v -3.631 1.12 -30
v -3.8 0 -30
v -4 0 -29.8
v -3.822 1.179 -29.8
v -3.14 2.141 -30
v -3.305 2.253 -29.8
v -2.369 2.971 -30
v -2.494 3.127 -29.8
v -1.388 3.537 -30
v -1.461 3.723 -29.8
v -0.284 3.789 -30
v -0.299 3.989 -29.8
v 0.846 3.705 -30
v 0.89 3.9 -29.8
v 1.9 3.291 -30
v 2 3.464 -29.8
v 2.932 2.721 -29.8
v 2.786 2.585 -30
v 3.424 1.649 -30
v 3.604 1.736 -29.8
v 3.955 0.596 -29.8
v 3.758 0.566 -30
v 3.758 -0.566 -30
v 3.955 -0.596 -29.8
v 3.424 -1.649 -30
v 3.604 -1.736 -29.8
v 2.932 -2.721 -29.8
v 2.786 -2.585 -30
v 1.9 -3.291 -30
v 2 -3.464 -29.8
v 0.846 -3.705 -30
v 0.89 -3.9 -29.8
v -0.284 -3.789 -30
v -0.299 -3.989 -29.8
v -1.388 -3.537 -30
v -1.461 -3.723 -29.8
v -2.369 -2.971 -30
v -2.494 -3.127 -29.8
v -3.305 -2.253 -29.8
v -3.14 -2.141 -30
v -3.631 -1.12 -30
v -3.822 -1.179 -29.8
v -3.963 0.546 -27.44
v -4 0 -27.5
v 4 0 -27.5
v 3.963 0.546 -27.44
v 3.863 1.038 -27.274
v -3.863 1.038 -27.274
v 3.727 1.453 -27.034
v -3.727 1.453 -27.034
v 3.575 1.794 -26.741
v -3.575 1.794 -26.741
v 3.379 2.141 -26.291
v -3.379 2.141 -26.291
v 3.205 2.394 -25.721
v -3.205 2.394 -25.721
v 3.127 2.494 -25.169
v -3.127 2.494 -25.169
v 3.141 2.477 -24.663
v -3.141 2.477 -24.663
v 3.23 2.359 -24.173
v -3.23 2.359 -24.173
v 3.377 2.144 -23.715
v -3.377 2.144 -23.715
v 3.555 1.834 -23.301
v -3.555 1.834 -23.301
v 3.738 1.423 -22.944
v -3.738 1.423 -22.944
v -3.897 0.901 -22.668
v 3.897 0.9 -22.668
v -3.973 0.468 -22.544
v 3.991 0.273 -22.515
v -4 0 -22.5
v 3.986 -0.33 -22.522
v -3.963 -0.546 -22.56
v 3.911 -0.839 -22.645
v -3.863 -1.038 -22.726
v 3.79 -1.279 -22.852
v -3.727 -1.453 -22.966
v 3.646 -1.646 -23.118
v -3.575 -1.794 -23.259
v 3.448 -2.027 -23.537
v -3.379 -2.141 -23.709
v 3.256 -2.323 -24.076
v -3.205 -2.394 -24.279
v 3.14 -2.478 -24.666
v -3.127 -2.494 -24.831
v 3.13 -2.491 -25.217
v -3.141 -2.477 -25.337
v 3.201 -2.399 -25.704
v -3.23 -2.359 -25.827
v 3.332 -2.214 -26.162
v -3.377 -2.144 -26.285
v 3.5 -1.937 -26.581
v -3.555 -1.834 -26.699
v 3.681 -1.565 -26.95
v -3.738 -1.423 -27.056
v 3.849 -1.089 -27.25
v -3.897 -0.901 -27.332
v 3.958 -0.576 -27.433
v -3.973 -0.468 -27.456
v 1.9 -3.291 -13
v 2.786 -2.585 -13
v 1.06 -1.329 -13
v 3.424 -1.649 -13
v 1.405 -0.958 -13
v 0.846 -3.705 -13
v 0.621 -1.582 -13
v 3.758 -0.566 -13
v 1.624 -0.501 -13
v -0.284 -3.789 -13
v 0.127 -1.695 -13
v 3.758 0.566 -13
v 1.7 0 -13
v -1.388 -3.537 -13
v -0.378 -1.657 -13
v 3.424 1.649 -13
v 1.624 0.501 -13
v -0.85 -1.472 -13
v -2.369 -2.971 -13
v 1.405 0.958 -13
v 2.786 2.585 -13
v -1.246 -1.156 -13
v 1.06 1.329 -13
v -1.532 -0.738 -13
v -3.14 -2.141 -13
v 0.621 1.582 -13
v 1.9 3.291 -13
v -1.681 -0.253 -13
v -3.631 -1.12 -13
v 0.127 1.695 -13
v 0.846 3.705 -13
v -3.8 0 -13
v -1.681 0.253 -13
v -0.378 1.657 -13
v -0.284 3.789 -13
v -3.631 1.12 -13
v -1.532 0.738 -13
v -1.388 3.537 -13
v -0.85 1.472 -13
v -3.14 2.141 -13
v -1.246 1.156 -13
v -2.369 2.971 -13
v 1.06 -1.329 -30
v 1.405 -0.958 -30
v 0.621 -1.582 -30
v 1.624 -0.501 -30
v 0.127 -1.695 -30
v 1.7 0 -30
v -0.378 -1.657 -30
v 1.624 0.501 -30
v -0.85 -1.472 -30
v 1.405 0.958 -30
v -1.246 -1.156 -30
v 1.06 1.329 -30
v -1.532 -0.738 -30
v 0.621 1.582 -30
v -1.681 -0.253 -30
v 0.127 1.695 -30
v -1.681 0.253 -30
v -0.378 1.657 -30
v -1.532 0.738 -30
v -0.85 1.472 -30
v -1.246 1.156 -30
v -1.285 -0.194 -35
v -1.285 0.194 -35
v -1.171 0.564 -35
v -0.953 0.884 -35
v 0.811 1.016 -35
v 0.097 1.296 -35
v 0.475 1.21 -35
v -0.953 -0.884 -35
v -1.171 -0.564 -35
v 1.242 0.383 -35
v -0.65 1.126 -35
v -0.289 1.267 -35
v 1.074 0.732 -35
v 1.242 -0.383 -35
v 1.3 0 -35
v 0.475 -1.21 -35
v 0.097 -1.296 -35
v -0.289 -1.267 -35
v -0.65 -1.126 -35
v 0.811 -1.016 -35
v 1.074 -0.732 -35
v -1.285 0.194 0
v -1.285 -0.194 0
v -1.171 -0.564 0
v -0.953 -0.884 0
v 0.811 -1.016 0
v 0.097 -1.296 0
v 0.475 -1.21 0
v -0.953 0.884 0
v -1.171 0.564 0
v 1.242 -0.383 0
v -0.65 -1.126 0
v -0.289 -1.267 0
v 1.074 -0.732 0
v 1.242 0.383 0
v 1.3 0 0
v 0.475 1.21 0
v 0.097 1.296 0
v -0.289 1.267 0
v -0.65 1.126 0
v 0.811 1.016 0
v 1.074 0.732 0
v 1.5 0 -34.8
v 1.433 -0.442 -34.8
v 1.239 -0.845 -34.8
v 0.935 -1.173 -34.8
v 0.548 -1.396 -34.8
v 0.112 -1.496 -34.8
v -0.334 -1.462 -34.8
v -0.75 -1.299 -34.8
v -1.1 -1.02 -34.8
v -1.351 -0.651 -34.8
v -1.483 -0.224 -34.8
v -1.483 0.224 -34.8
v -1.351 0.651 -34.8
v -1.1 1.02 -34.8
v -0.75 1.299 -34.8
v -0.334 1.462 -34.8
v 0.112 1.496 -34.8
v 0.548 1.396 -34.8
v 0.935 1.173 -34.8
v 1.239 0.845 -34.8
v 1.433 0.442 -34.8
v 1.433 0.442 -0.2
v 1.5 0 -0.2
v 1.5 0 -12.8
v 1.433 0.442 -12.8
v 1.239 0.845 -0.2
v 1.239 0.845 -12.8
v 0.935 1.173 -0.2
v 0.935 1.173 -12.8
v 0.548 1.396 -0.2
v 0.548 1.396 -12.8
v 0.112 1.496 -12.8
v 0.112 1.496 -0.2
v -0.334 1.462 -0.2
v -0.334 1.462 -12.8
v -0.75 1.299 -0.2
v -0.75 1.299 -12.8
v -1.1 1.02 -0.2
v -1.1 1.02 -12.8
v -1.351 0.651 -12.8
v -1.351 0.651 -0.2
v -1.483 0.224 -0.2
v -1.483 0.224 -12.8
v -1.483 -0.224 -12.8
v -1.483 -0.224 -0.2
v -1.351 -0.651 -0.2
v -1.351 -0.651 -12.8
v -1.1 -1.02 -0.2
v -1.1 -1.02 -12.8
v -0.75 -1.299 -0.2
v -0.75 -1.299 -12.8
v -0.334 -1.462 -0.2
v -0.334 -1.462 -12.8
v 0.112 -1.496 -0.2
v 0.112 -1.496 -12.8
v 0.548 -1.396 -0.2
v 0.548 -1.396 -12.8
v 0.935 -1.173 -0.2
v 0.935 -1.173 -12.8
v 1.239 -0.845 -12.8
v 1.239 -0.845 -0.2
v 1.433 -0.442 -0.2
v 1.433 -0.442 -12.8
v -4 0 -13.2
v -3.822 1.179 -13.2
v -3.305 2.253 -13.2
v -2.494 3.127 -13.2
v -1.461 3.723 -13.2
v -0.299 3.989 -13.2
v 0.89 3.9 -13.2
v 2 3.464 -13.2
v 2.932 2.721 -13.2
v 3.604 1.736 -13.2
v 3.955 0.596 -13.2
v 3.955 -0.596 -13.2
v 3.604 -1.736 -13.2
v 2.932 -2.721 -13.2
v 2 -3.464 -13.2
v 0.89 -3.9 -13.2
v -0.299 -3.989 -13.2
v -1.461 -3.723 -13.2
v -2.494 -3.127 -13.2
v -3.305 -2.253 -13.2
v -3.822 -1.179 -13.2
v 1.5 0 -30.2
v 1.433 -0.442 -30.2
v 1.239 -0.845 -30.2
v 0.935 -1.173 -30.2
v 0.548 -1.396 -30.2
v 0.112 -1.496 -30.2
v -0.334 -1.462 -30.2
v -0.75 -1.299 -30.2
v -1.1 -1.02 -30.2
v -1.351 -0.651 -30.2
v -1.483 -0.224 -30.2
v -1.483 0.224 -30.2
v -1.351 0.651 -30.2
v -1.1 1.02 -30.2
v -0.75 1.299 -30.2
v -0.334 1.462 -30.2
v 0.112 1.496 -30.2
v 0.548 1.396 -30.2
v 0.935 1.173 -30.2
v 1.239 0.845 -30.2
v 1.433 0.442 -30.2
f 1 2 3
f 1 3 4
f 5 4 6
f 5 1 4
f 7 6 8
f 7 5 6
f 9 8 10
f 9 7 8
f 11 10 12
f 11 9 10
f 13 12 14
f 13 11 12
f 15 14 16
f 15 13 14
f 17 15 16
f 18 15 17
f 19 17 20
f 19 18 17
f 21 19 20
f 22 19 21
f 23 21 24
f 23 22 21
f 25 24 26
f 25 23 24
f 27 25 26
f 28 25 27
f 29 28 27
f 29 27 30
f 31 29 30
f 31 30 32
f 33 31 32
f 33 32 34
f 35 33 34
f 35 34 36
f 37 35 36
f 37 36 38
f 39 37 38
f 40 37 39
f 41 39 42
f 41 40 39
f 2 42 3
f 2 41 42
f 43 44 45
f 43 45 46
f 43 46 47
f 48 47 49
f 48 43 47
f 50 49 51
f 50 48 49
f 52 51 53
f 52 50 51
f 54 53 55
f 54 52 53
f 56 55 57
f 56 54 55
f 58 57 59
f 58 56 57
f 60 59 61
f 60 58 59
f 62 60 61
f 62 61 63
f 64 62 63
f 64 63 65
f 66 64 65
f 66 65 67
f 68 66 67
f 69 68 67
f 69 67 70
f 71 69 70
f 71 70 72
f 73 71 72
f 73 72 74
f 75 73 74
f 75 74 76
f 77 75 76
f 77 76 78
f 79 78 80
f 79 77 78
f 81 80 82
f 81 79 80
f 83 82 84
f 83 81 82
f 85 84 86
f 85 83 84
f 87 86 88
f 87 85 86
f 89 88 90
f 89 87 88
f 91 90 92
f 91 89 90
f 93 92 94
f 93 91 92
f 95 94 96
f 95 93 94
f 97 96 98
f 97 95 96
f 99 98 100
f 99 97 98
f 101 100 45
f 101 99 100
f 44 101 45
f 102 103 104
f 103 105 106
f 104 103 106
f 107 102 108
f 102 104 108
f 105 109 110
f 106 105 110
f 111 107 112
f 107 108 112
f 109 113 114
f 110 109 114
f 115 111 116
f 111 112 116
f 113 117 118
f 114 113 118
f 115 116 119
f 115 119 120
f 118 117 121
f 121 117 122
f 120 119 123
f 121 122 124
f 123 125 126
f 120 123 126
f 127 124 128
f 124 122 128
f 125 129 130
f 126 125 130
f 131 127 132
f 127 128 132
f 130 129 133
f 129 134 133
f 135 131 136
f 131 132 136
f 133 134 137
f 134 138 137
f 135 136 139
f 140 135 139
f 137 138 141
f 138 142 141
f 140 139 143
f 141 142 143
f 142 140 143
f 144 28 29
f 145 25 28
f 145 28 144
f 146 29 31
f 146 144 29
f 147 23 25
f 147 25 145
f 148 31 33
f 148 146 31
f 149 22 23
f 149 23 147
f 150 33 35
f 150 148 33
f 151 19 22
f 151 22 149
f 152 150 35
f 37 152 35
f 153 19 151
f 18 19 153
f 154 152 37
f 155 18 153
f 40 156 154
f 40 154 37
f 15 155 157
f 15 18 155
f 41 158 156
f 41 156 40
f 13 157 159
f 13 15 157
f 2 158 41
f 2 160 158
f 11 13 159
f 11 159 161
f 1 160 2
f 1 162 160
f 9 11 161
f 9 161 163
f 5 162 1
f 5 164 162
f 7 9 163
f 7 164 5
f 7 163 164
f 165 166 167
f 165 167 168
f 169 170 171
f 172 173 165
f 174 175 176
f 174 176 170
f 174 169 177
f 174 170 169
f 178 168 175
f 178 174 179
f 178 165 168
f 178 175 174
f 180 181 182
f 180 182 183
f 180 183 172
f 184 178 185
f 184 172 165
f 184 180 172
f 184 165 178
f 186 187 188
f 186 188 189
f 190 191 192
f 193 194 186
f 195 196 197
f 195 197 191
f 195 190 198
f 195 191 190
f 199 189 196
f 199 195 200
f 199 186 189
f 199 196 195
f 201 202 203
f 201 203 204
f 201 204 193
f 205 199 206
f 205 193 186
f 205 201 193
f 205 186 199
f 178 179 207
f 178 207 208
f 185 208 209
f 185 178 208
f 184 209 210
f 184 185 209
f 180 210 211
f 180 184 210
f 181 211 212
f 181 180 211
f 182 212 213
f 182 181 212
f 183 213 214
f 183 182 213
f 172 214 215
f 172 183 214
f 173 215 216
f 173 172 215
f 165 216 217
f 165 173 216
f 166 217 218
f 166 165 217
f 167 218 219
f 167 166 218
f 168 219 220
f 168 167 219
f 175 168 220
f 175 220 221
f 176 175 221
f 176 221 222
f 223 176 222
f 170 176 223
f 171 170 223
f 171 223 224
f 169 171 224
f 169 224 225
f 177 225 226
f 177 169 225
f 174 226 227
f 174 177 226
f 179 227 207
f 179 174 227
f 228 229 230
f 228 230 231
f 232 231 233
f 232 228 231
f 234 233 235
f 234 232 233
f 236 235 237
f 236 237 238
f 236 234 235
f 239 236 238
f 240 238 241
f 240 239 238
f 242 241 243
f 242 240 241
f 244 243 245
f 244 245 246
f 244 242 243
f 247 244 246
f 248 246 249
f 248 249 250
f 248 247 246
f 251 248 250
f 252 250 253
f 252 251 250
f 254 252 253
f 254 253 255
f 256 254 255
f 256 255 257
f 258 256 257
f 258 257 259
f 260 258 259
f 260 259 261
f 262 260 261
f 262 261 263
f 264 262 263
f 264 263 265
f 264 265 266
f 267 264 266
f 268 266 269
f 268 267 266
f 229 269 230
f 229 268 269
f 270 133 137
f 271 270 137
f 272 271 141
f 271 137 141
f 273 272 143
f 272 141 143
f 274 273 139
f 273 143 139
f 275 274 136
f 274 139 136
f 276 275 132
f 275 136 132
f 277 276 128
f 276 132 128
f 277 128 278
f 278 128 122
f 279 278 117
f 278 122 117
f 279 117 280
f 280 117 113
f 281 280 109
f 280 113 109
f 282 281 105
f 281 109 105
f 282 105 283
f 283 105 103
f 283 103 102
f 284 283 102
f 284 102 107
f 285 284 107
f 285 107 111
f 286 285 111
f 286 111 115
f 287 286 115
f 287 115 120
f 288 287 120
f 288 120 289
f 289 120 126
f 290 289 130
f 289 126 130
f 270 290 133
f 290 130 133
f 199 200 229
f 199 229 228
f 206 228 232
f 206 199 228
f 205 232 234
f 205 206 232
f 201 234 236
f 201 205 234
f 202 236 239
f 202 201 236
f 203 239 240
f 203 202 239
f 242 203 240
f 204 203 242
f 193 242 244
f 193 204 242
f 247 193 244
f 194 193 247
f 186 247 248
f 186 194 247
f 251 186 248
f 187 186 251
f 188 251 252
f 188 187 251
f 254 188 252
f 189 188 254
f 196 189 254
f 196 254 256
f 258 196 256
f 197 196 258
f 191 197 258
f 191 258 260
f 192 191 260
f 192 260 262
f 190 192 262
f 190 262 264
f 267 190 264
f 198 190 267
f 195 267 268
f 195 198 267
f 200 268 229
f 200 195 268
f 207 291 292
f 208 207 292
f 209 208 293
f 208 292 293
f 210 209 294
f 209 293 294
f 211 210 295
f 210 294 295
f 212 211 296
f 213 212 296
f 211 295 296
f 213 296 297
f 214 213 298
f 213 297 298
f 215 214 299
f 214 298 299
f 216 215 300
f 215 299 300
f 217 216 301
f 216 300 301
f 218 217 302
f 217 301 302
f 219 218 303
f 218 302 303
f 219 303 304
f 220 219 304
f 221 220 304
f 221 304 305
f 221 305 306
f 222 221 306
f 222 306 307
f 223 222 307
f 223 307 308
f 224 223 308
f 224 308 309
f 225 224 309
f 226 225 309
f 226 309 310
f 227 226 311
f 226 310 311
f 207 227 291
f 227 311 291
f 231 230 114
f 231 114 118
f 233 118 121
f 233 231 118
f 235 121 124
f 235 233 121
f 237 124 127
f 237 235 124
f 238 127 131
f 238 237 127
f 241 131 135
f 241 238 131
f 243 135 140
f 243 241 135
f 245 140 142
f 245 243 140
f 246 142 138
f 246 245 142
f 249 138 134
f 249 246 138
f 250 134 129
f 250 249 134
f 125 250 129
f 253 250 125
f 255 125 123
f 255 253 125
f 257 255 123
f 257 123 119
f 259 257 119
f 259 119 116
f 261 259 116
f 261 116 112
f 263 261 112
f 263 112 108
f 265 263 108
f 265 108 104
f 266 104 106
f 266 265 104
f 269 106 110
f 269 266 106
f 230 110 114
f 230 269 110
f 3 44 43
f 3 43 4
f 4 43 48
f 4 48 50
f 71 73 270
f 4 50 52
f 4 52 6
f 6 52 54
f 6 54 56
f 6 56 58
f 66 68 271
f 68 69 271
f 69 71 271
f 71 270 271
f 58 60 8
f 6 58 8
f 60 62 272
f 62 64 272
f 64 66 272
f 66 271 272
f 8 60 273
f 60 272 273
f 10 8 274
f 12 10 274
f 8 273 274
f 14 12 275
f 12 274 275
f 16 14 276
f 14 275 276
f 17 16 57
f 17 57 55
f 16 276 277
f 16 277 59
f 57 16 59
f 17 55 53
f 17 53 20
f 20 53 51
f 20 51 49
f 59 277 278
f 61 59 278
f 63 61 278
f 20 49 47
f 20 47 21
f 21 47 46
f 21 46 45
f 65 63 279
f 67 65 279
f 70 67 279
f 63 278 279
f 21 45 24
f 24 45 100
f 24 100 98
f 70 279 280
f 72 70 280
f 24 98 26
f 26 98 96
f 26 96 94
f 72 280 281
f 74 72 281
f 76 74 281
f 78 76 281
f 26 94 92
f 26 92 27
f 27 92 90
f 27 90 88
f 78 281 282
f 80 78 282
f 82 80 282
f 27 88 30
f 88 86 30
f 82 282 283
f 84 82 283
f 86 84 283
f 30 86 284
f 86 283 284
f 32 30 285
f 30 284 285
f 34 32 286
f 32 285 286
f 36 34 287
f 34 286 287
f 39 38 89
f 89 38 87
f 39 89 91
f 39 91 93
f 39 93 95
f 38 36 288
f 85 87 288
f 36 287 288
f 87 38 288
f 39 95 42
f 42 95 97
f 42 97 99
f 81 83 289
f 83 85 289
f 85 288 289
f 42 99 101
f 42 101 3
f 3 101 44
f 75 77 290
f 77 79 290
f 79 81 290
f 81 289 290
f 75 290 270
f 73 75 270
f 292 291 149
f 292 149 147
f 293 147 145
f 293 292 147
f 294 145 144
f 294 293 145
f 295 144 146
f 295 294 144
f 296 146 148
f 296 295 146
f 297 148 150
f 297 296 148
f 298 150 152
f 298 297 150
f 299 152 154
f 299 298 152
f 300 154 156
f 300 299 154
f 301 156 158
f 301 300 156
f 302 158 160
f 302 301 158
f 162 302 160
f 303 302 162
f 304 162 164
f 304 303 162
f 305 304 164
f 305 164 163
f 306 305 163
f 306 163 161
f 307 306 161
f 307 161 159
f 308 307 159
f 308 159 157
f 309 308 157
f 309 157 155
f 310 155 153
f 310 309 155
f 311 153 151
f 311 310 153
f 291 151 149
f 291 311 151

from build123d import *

# Parameters (mm, degrees)
SKETCH1_R               = 1.5
BOSS_EXTRUDE1_DEPTH     = 13
SKETCH2_R               = 4
BOSS_EXTRUDE2_DEPTH     = 17
SKETCH3_R               = 1.5
BOSS_EXTRUDE3_DEPTH     = 5
CUT_EXTRUDE1_DEPTH      = 36.454195802
CUT_EXTRUDE1_DEPTH_BACK = 36.454195802
SKETCH4_R               = 2.5
CHAMFER1_SIZE           = 0.2


with BuildPart() as part:
    # Sketch1 → Boss-Extrude1 (new body)
    with BuildSketch(Plane.XY):
        Circle(SKETCH1_R)
    extrude(amount=-BOSS_EXTRUDE1_DEPTH)

    # Sketch2 → Boss-Extrude2 (add)
    with BuildSketch(Plane(origin=(0, 0, -13), x_dir=(-1, 0, 0), z_dir=(0, 0, -1))):
        Circle(SKETCH2_R)
    extrude(amount=BOSS_EXTRUDE2_DEPTH)

    # Sketch3 → Boss-Extrude3 (add)
    with BuildSketch(Plane(origin=(0, 0, -30), x_dir=(-1, 0, 0), z_dir=(0, 0, -1))):
        with Locations(Location((0, 0, 0), (0, 0, 180))):
            Circle(SKETCH3_R)
    extrude(amount=BOSS_EXTRUDE3_DEPTH)

    # Sketch4 → Cut-Extrude1 (cut, two sides: drawn at the far end of the back side and taken through both)
    with BuildSketch(Plane(origin=(0, 0, 0), x_dir=(0, 0, -1), z_dir=(1, 0, 0)).offset(-CUT_EXTRUDE1_DEPTH_BACK)):
        with Locations((25, 0)):
            Circle(SKETCH4_R)
    extrude(amount=CUT_EXTRUDE1_DEPTH + CUT_EXTRUDE1_DEPTH_BACK, mode=Mode.SUBTRACT)

    # Chamfer1
    chamfer1_edges = [part.edges().sort_by_distance(p)[0] for p in [
        (-1.5, 0, -30),
        (-1.5, 0, -35),
        (-1.5, 0, 0),
        (-1.5, 0, -13),
        (4, 0, -13),
        (4, 0, -30),
    ]]
    chamfer(chamfer1_edges, length=CHAMFER1_SIZE)


solid = part.part
